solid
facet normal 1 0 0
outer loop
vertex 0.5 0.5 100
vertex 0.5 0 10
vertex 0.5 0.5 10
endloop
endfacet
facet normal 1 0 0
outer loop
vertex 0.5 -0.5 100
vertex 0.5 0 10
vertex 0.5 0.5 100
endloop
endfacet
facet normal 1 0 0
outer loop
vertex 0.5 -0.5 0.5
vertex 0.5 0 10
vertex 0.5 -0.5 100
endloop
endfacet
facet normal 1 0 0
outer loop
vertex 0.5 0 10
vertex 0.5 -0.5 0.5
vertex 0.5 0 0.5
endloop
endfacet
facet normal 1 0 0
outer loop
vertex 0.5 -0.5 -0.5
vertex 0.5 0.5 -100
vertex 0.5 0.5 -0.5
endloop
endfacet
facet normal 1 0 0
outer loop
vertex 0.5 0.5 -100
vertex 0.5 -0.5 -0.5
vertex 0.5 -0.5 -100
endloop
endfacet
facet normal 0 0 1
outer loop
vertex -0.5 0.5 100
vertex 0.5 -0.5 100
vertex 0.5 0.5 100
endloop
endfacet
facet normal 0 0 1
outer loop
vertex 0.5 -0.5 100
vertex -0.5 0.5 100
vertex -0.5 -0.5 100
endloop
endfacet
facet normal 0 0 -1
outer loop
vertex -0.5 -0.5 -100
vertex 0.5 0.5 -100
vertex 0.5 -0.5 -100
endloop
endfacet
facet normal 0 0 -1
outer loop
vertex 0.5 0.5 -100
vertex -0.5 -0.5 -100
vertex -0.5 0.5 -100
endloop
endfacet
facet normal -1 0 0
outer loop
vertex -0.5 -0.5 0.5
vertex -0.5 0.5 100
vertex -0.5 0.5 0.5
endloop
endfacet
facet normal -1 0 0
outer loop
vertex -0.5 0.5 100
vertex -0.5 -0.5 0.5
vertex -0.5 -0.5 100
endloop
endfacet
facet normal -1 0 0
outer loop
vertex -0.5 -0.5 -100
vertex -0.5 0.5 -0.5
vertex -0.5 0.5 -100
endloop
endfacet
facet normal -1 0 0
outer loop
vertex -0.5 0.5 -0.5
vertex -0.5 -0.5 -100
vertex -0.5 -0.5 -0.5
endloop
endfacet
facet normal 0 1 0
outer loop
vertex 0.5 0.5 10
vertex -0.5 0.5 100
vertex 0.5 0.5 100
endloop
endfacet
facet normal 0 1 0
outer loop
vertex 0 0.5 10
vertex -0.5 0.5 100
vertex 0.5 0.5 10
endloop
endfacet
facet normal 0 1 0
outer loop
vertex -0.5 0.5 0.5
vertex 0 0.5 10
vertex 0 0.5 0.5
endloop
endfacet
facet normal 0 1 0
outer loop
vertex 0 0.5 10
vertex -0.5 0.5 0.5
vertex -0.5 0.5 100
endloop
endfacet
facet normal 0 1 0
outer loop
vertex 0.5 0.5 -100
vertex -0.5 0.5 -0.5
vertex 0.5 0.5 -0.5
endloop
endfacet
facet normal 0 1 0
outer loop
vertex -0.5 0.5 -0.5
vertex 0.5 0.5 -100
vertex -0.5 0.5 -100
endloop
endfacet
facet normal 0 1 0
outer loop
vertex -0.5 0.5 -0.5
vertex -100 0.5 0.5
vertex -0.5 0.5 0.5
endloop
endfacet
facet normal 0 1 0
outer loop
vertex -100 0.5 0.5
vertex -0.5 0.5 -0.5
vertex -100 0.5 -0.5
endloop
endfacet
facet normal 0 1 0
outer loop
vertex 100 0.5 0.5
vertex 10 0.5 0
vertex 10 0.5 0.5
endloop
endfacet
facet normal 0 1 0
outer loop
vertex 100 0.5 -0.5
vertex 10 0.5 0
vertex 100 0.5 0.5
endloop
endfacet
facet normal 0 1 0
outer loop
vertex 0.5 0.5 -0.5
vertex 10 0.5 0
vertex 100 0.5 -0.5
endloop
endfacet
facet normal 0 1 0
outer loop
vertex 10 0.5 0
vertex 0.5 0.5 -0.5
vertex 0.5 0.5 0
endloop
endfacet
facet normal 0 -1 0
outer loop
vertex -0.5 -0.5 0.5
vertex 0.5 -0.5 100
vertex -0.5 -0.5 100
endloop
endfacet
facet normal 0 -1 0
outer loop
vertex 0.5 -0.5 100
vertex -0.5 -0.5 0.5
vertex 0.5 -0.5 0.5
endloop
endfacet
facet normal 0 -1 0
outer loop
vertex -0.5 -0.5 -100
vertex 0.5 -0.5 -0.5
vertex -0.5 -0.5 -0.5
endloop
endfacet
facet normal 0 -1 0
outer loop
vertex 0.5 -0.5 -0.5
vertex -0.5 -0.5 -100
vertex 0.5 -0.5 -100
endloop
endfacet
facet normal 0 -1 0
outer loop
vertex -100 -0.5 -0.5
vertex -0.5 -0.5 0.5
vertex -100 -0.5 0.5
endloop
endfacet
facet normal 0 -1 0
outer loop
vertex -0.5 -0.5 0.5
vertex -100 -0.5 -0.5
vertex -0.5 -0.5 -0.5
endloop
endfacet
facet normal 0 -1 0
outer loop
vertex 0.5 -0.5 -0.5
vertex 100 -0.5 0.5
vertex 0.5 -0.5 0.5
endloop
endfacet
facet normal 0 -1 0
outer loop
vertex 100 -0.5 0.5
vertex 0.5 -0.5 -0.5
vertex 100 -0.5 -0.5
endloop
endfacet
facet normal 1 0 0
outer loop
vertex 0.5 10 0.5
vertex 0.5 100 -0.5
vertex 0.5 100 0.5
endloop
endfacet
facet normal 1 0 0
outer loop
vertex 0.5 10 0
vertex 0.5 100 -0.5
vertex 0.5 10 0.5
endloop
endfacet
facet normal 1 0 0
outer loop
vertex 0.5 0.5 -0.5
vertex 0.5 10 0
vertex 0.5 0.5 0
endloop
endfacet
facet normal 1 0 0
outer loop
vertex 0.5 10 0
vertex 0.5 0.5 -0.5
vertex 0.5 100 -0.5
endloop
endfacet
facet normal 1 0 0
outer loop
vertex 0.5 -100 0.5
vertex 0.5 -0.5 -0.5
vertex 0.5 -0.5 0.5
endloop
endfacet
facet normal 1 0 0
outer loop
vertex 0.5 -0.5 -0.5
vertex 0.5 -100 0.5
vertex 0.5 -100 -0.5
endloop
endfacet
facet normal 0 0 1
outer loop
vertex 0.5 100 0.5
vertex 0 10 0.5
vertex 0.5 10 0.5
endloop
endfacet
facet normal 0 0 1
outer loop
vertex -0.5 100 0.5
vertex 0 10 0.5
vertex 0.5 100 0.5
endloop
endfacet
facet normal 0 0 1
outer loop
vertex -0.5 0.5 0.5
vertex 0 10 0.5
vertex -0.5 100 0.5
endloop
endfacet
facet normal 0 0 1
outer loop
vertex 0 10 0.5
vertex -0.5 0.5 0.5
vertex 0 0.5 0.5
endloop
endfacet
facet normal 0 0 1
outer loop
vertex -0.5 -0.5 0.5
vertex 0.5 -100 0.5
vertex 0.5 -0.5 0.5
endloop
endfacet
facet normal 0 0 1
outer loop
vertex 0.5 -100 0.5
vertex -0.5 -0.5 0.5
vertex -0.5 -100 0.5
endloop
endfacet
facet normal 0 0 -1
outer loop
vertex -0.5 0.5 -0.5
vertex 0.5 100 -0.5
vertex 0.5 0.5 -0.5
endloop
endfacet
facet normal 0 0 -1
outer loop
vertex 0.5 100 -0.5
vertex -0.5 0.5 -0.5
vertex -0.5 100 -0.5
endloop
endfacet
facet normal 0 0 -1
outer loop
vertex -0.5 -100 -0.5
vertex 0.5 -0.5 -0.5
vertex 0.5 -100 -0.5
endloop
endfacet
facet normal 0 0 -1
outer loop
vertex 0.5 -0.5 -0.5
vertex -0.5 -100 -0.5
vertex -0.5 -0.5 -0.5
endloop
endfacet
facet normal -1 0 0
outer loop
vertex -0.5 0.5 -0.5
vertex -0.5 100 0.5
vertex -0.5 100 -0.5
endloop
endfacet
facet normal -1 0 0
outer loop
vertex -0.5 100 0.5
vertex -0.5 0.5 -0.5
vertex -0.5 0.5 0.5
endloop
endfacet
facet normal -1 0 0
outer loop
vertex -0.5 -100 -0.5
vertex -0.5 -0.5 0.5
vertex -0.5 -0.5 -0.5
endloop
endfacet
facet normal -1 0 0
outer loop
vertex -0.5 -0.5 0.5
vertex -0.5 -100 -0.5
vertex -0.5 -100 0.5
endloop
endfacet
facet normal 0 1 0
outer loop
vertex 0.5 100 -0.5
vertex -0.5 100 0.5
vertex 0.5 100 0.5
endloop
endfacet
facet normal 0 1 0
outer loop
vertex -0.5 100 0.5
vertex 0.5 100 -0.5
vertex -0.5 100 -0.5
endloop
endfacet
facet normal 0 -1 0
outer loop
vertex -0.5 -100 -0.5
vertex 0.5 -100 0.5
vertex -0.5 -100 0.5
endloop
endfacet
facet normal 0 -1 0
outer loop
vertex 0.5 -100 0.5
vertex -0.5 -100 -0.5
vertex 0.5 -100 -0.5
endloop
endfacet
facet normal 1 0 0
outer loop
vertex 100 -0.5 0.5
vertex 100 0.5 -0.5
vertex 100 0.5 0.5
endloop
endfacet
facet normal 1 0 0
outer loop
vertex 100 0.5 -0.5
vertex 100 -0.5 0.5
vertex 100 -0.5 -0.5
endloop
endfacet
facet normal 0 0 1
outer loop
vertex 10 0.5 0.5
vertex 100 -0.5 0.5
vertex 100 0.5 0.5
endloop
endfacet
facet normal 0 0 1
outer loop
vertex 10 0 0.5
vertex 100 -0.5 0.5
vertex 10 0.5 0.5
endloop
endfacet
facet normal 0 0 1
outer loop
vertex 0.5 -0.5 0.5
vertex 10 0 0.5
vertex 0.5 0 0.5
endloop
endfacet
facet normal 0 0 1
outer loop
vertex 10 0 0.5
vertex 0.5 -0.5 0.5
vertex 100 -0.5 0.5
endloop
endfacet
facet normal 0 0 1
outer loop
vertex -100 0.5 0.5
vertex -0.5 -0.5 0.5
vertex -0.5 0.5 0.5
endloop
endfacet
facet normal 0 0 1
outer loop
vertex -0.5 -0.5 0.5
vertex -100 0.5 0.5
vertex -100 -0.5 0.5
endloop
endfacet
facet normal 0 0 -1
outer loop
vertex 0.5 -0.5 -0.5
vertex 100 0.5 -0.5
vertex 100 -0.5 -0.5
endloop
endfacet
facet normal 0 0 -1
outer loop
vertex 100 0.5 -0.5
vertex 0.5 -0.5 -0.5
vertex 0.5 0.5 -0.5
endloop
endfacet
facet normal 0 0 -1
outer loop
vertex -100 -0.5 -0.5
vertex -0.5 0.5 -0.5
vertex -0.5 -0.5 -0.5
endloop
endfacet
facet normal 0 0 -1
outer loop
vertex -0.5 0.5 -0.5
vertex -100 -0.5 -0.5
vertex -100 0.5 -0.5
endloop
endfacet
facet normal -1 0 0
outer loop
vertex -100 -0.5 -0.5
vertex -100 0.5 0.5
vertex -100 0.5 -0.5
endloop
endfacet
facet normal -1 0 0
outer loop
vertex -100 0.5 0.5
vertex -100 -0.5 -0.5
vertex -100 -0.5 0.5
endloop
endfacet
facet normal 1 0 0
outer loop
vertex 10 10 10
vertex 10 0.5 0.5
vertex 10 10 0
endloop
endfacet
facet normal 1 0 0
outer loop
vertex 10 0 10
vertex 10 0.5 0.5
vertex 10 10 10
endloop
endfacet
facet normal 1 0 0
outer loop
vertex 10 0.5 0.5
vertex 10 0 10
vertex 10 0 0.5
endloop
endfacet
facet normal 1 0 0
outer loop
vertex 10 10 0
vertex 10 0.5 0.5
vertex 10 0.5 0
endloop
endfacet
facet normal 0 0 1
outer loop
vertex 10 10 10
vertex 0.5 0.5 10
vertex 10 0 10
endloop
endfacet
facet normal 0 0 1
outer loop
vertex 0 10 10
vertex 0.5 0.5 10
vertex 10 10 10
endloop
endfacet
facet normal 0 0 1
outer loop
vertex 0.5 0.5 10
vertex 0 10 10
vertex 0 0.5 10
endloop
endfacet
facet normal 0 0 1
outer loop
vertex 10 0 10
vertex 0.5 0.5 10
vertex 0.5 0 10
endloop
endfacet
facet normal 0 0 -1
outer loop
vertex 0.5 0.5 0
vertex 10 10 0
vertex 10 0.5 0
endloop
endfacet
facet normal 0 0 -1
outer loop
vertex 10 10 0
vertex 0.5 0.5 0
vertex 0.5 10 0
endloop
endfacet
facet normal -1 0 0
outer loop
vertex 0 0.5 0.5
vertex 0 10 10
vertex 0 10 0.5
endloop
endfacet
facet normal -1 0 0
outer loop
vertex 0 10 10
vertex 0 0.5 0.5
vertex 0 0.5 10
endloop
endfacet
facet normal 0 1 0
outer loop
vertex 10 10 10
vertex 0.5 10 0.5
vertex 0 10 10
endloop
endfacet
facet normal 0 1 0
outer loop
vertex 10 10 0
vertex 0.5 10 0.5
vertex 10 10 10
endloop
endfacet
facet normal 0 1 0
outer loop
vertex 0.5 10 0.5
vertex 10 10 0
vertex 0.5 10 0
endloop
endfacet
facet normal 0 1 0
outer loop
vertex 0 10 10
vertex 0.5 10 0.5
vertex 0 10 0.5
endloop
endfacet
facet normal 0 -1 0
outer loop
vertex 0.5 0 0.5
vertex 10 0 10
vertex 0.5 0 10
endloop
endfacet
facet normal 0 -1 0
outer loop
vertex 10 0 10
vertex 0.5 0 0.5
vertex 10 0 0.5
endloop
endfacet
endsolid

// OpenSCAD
// axis
cube([1,1,200],center=true);
cube([1,200,1],center=true);
cube([200,1,1],center=true);

cube(10);
